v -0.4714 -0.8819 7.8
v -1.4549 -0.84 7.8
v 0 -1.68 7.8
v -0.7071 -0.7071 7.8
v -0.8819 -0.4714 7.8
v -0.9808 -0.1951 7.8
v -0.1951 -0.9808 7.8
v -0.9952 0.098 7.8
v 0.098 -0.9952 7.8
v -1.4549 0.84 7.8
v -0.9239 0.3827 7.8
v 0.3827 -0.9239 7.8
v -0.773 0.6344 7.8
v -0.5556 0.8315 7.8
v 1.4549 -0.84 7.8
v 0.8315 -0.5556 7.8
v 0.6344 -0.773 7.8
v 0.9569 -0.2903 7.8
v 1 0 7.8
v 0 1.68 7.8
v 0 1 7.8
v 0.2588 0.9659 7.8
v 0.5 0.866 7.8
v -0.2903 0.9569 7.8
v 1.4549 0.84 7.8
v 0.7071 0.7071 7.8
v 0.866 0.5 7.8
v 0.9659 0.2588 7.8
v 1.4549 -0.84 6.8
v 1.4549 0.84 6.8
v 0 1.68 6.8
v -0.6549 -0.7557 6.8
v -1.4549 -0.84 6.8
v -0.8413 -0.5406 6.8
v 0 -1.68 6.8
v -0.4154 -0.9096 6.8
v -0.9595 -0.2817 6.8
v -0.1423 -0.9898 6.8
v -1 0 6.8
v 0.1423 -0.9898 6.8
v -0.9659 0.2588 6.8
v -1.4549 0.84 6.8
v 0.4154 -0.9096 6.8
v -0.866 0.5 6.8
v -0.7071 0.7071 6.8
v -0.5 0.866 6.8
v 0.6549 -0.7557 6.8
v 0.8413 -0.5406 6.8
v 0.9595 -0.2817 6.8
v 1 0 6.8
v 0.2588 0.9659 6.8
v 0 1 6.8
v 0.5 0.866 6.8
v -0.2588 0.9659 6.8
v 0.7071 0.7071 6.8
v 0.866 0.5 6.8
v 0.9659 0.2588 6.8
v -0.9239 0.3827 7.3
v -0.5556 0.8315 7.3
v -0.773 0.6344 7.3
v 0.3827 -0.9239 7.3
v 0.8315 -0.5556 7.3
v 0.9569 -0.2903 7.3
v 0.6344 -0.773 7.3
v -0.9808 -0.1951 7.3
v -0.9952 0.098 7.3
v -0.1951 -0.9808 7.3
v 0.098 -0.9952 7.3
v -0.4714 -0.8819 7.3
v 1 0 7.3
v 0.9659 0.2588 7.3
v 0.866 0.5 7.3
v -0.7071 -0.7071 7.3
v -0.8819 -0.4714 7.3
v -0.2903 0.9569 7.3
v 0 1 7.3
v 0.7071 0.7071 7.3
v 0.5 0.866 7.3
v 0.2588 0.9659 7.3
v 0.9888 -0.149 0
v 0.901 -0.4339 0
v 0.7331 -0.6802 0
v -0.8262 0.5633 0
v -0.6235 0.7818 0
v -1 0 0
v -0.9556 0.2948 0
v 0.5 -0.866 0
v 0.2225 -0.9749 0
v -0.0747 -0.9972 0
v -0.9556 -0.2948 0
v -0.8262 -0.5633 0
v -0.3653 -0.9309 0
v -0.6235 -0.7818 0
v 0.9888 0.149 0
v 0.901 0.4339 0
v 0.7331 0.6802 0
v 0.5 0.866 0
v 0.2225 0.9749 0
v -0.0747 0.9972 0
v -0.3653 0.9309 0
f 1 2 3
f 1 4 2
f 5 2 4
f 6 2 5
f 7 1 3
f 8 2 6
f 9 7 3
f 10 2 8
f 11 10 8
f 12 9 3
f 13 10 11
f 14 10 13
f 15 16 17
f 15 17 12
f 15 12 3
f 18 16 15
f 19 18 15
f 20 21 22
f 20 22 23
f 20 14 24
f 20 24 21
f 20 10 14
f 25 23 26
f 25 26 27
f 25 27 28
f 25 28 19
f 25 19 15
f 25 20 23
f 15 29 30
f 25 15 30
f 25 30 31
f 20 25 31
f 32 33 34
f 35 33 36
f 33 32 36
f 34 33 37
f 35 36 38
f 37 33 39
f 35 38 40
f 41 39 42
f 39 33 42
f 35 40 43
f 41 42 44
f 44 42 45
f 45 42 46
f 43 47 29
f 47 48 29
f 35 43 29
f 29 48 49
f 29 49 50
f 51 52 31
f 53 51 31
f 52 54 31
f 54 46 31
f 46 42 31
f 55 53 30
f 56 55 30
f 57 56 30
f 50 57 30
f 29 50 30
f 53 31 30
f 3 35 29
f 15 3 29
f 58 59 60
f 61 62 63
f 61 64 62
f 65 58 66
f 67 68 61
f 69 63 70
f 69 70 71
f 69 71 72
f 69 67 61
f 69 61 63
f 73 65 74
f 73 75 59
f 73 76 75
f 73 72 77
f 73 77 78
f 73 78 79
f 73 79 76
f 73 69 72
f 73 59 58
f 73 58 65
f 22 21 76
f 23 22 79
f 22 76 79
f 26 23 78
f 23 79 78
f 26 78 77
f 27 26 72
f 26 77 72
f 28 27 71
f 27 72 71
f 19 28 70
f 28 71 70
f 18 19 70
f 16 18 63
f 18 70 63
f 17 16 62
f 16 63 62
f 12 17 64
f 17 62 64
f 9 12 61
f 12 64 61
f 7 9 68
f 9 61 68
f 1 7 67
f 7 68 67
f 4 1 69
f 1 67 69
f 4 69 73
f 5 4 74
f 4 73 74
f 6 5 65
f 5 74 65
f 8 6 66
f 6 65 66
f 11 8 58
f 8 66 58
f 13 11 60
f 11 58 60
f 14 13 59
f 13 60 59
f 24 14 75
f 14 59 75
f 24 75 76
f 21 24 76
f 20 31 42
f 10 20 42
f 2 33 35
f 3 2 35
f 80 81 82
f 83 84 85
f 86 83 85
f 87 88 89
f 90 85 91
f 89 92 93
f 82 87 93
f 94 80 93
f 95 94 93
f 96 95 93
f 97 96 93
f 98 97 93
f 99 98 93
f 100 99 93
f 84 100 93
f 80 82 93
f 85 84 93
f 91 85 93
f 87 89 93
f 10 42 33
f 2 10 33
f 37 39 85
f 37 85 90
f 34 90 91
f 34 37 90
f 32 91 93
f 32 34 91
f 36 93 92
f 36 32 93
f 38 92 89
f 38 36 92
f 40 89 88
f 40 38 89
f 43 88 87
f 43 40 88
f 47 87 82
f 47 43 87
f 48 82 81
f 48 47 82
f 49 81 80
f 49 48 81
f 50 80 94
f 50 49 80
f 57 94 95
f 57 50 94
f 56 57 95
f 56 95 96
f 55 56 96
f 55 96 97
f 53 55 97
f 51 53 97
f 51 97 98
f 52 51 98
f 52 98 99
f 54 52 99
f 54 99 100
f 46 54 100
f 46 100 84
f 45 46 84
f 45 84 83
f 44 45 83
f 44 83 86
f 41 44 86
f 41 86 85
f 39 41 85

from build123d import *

# Parameters (mm, degrees)
F0_W     = 1
F0_H     = 6.8
F3_DEPTH = 1
F4_R     = 1
F5_DEPTH = 0.5


# Not quite as in the source:
# - a pattern or mirror of a feature is missing from the dataset's text; its kind, count and spacing are read off the source's solid


with BuildPart() as f1:
    # F0 (on Front) → F1 (revolve)
    with BuildSketch(Plane.XZ):
        with Locations((-0.5, 3.4)):
            Rectangle(F0_W, F0_H)
    revolve(axis=Axis((0, 0, 3.4), (0, 0, 1)))

    # F1_copies: F1 across plane


with BuildPart() as f1_1:
    add(f1.part)
    add(f1.part.mirror(Plane.XY.offset(3.65)))

    # F2 (on face) → F3 (join)
    with BuildSketch(Plane.XY.offset(6.8)):
        Polygon((1.4549226784, 0.84), (0, 1.68), (-1.4549226784, 0.84), (-1.4549226784, -0.84), (0, -1.68), (1.4549226784, -0.84), align=None)
        with BuildLine():
            ThreePointArc((1, 0), (-0.7071067812, -0.7071067812), (0, 1))
            ThreePointArc((0, 1), (0.7071067812, 0.7071067812), (1, 0))
        make_face(mode=Mode.SUBTRACT)
    extrude(amount=F3_DEPTH)

    # F4 (on face) → F5 (cut)
    with BuildSketch(Plane.XY.offset(7.8)):
        Circle(F4_R)
    extrude(amount=-F5_DEPTH, mode=Mode.SUBTRACT)


solid = f1_1.part
